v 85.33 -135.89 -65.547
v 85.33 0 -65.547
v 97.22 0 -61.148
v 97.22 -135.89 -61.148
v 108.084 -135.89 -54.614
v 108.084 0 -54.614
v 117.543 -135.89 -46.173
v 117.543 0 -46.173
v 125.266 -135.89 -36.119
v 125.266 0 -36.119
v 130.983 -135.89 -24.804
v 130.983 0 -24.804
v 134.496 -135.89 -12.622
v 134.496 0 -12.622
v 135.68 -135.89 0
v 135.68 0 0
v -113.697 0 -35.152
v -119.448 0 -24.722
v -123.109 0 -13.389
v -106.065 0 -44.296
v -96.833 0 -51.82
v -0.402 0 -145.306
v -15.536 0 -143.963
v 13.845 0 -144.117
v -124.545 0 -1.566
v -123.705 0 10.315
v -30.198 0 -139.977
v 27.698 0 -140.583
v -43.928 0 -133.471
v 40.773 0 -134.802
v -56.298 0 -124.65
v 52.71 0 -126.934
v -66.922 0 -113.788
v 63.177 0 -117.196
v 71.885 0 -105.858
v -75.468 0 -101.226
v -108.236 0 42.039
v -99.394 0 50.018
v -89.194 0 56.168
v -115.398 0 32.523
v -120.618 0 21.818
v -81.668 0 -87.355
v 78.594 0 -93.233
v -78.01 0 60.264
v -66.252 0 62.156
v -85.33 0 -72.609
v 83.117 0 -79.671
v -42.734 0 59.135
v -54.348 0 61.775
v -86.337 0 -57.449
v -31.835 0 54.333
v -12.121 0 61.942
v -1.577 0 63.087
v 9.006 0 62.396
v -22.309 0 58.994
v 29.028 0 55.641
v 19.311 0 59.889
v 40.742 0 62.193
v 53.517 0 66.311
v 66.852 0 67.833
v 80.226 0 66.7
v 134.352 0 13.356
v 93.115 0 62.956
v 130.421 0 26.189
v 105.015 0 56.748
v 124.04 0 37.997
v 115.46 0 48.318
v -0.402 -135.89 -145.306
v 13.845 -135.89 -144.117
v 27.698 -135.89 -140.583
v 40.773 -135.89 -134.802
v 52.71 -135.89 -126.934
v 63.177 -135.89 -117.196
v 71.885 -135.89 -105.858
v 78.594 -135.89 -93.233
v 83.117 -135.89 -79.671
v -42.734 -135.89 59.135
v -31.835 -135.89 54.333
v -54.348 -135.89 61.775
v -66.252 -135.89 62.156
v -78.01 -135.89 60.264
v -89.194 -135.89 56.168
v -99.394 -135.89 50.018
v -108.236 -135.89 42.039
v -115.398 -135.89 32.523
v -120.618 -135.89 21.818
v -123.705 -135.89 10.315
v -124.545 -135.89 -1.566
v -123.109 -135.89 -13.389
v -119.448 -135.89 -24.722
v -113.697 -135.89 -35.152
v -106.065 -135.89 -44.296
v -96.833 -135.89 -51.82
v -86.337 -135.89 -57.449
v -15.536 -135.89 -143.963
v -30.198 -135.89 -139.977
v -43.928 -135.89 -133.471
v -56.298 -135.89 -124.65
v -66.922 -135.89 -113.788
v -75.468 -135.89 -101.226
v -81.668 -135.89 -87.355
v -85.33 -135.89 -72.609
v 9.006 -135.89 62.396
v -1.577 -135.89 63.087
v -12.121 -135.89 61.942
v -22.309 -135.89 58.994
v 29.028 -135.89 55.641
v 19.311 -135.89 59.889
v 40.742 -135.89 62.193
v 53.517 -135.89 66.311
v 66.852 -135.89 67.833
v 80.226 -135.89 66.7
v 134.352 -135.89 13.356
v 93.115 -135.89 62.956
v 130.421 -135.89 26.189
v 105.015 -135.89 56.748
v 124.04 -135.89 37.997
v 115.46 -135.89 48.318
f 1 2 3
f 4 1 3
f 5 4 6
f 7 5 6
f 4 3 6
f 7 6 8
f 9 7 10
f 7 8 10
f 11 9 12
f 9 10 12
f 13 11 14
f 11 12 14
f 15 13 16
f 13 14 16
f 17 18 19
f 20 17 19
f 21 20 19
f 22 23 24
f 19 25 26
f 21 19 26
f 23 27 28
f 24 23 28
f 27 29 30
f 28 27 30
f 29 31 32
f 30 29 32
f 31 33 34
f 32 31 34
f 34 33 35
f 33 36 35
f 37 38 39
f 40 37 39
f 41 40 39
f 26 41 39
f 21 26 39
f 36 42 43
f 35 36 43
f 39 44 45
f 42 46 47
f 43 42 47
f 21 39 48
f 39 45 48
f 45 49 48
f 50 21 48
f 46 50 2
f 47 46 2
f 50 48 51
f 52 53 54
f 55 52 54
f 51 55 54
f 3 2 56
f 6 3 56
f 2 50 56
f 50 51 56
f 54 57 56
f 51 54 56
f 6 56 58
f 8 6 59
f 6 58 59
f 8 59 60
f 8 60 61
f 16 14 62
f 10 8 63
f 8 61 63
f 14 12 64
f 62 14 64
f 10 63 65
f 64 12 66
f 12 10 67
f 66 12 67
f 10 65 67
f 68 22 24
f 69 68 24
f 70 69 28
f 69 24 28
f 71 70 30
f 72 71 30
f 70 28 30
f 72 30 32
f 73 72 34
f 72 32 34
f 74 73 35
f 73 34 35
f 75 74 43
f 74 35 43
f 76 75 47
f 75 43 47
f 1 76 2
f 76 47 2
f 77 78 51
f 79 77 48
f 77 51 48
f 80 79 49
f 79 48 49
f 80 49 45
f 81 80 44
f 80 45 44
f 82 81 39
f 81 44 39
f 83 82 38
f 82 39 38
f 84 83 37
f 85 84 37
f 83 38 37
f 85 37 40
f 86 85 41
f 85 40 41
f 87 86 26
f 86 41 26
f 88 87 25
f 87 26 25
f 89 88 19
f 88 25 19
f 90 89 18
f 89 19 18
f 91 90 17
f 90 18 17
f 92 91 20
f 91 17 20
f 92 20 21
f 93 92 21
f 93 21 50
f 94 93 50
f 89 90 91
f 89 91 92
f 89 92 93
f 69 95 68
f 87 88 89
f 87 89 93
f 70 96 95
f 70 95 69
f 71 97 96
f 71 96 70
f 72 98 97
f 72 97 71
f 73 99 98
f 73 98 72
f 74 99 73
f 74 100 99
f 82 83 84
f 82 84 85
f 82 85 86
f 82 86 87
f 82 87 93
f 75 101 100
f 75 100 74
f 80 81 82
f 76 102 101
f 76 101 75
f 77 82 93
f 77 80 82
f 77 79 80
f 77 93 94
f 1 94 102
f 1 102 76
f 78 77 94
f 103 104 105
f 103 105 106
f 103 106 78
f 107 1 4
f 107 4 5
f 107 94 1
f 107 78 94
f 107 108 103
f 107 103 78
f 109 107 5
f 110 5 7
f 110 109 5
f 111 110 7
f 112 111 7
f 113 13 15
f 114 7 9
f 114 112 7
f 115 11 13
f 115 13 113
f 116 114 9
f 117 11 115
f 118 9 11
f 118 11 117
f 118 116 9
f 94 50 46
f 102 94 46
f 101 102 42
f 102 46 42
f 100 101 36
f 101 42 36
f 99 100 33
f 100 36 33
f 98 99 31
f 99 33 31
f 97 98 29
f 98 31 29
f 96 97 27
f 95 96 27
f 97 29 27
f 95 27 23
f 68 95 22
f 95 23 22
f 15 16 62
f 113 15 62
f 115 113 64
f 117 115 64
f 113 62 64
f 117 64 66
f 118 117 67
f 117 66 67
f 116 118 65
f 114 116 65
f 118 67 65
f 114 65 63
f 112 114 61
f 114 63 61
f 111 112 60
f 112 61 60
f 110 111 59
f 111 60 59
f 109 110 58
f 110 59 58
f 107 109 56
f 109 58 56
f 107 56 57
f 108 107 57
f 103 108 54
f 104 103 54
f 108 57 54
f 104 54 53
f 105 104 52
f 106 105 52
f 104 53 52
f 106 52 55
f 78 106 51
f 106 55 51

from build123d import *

# Parameters (mm, degrees)
F1_DEPTH = 135.89


with BuildPart() as f1:
    # F0 (on Front) → F1 (new body)
    with BuildSketch(Plane.XZ):
        with BuildLine():
            ThreePointArc((-0.402361, -59.350092), (-14.92337, -57.568817), (-28.607244, -52.393469))
            ThreePointArc((-28.607244, -52.393469), (-56.848471, -62.044811), (-86.337414, -57.449427))
            ThreePointArc((-86.337414, -57.449427), (-61.850793, -119.454468), (-0.402361, -145.306161))
            ThreePointArc((-0.402361, -145.306161), (20.97924, -102.328126), (-0.402361, -59.350092))
        make_face()
        with BuildLine():
            ThreePointArc((5.353071, 26.413075), (1.351735, 13.475031), (0, 0))
            ThreePointArc((0, 0), (26.5136, -53.799627), (85.330052, -65.546792))
            ThreePointArc((85.330052, -65.546792), (121.639734, -41.326507), (135.680214, 0))
            ThreePointArc((135.680214, 0), (99.219052, 60.146836), (29.028204, 55.640959))
            ThreePointArc((29.028204, 55.640959), (15.124492, 42.700633), (5.353071, 26.413075))
        make_face()
        with BuildLine():
            ThreePointArc((-31.83483, 54.332647), (-16.674524, 42.414806), (-5.886424, 26.430855))
            ThreePointArc((-5.886424, 26.430855), (-0.266385, 26.605869), (5.353071, 26.413075))
            ThreePointArc((5.353071, 26.413075), (15.124492, 42.700633), (29.028204, 55.640959))
            ThreePointArc((29.028204, 55.640959), (-1.577442, 63.087342), (-31.83483, 54.332647))
        make_face()
        with BuildLine():
            ThreePointArc((-28.607244, -52.393469), (-7.617664, -29.84732), (0, 0))
            ThreePointArc((0, 0), (-1.489415, 13.539203), (-5.886424, 26.430855))
            ThreePointArc((-5.886424, 26.430855), (-16.674524, 42.414806), (-31.83483, 54.332647))
            ThreePointArc((-31.83483, 54.332647), (-118.264652, 27.295814), (-86.337414, -57.449427))
            ThreePointArc((-86.337414, -57.449427), (-56.848471, -62.044811), (-28.607244, -52.393469))
        make_face()
        with BuildLine():
            ThreePointArc((85.330052, -65.546792), (26.5136, -53.799627), (0, 0))
            ThreePointArc((0, 0), (-7.617664, -29.84732), (-28.607244, -52.393469))
            ThreePointArc((-28.607244, -52.393469), (-14.92337, -57.568817), (-0.402361, -59.350092))
            ThreePointArc((-0.402361, -59.350092), (20.97924, -102.328126), (-0.402361, -145.306161))
            ThreePointArc((-0.402361, -145.306161), (58.145917, -122.282952), (85.330052, -65.546792))
        make_face()
        with BuildLine():
            ThreePointArc((-5.886424, 26.430855), (-1.489415, 13.539203), (0, 0))
            ThreePointArc((0, 0), (1.351735, 13.475031), (5.353071, 26.413075))
            ThreePointArc((5.353071, 26.413075), (-0.266385, 26.605869), (-5.886424, 26.430855))
        make_face()
    extrude(amount=F1_DEPTH)


solid = f1.part
